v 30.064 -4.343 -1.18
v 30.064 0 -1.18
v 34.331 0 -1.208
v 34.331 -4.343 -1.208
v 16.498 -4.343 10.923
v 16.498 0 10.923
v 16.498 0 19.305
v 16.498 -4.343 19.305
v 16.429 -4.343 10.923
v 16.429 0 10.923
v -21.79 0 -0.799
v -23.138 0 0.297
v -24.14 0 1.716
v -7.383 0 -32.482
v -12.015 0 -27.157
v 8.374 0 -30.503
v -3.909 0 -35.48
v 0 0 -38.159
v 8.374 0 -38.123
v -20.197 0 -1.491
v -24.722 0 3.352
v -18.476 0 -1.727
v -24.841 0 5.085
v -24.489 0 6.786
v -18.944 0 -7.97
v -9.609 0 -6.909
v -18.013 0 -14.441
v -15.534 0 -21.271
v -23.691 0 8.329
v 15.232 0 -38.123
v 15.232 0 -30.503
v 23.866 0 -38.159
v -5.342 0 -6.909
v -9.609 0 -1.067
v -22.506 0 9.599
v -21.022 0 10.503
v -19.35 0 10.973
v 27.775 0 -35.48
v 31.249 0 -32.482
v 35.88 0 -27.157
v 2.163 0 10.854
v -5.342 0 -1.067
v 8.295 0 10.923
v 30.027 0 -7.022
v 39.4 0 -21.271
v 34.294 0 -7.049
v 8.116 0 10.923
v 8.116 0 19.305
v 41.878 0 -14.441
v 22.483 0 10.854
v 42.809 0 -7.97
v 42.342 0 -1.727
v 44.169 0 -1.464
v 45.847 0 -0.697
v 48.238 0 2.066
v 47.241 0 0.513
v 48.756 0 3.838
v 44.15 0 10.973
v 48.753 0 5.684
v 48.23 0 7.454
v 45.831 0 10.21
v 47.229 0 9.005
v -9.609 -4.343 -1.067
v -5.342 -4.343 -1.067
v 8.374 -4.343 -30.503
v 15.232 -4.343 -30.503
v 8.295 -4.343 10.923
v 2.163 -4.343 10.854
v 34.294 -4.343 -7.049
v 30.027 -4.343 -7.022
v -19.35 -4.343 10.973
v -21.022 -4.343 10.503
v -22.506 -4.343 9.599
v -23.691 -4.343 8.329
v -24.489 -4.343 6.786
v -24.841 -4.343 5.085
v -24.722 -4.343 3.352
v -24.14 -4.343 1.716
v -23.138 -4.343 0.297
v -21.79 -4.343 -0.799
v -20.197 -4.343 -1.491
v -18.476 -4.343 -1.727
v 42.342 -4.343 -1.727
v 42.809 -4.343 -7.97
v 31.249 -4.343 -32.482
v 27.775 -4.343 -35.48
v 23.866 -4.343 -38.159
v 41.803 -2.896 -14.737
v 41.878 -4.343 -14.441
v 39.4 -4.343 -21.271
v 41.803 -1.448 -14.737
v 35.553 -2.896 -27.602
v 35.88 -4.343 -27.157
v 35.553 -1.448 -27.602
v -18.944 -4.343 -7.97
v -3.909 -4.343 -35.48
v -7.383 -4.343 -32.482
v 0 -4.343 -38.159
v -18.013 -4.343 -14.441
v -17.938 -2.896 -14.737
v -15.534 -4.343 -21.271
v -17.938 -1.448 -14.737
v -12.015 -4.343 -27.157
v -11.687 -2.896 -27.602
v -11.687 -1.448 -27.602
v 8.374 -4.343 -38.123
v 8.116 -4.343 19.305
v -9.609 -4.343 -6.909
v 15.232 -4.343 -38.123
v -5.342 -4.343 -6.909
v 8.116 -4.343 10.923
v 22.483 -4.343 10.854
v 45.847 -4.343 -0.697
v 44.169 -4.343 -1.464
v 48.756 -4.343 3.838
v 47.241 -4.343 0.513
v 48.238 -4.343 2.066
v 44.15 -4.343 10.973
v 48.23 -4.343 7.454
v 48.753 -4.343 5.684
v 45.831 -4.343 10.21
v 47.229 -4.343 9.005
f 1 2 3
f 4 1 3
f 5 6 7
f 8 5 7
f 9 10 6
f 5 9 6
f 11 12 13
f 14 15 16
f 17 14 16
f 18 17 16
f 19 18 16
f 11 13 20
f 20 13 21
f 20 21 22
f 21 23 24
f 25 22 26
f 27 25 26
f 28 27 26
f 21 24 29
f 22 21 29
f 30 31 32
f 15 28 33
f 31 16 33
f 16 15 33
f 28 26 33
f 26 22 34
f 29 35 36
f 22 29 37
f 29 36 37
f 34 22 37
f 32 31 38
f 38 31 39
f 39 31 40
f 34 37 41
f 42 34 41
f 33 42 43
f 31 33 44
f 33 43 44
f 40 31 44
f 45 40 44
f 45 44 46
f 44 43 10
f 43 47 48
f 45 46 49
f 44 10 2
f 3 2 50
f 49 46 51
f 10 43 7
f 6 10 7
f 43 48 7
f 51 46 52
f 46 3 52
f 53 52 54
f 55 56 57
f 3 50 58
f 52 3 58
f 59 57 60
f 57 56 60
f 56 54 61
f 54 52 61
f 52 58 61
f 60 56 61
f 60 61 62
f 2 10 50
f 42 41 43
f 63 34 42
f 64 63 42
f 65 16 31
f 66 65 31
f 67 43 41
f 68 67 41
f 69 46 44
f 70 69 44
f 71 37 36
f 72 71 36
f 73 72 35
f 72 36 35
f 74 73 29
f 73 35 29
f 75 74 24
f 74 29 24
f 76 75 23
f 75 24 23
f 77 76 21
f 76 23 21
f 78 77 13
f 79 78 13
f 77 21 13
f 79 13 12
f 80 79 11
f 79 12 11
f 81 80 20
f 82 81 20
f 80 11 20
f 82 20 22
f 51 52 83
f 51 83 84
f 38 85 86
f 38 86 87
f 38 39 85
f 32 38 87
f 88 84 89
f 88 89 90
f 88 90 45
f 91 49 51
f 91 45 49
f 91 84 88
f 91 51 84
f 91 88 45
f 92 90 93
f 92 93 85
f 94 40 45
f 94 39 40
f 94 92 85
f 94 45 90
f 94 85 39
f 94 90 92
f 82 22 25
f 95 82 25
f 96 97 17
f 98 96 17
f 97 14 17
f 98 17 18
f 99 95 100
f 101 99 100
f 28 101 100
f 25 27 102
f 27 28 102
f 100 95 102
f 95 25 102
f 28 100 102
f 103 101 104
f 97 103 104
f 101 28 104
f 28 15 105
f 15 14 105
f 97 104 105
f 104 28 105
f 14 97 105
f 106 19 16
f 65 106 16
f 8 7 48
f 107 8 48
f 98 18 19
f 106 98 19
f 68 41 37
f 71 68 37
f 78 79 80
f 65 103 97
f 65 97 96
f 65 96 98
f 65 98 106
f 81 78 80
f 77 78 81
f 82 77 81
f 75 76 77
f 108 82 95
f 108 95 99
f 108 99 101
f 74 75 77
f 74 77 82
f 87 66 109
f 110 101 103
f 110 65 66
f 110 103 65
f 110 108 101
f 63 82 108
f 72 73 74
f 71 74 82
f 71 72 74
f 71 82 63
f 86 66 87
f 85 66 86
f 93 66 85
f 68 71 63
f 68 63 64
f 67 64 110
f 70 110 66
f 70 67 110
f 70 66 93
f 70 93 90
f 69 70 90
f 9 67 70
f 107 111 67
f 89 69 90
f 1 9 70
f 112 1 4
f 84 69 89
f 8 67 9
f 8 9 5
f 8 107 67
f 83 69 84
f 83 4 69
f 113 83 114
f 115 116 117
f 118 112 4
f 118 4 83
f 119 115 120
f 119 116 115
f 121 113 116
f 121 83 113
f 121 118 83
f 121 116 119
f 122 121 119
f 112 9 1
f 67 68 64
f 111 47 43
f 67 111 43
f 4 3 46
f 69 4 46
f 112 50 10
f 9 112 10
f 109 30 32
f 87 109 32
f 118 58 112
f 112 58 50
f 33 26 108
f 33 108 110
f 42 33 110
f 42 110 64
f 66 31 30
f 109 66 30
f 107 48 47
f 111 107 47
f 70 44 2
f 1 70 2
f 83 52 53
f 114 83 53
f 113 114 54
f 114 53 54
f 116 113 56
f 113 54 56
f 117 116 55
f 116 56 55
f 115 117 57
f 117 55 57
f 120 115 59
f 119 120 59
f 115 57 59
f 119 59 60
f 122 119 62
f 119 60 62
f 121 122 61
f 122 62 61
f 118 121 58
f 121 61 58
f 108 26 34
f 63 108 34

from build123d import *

# Parameters (mm, degrees)
F0_W     = 4.2672
F0_H     = 5.842
F1_DEPTH = 4.3434


with BuildPart() as f1:
    # F0 (on Front) → F1 (new body)
    with BuildSketch(Plane.XZ):
        with BuildLine():
            Line((2.1634316072, 10.8543494716), (-19.3501866255, 10.9726172321))
            ThreePointArc((-19.3501866255, 10.9726172321), (-24.8410026739, 4.2145660489), (-18.4759762851, -1.7273827679))
            add(Edge.make_bspline(
                [(-18.4759762851, -1.7273827679), (-20.8852616932, -14.0894673655), (-14.3136853987, -29.476307077), (0, -38.1591799864)],
                knots=[0, 0, 0, 0, 0.1710209887, 0.1710209887, 0.1710209887, 0.1710209887], degree=3))
            Line((0, -38.1591799864), (8.3743836731, -38.1230656058))
            Line((8.3743836731, -38.1230656058), (8.3743836731, -30.5030656058))
            Line((8.3743836731, -30.5030656058), (12.2675002734, -30.5030656058))
            Line((12.2675002734, -30.5030656058), (15.2323836731, -30.5030656058))
            Line((15.2323836731, -30.5030656058), (15.2323836731, -38.1230656058))
            Line((15.2323836731, -38.1230656058), (23.8656476492, -38.1591799864))
            add(Edge.make_bspline(
                [(42.3416239343, -1.7273827679), (44.7509093424, -14.0894673655), (38.1793330479, -29.476307077), (23.8656476492, -38.1591799864)],
                knots=[0, 0, 0, 0, 0.1710209887, 0.1710209887, 0.1710209887, 0.1710209887], degree=3))
            ThreePointArc((42.3416239343, -1.7273827679), (48.7556622303, 3.8381273274), (44.1498133745, 10.9726172321))
            Line((44.1498133745, 10.9726172321), (22.4834316072, 10.8543494716))
            Line((22.4834316072, 10.8543494716), (16.4287500314, 10.9232757241))
            Line((16.4287500314, 10.9232757241), (16.4984082512, 10.9232757241))
            Line((16.4984082512, 10.9232757241), (16.4984082512, 19.3052757241))
            Line((16.4984082512, 19.3052757241), (8.1164082512, 19.3052757241))
            Line((8.1164082512, 19.3052757241), (8.1164082512, 10.9232757241))
            Line((8.1164082512, 10.9232757241), (8.294825498, 10.9232757241))
            Line((8.294825498, 10.9232757241), (2.1634316072, 10.8543494716))
        make_face()
        with Locations((-7.4751781712, -3.9884169885)):
            Rectangle(F0_W, F0_H, mode=Mode.SUBTRACT)
        Polygon((30.0267527077, -7.0222468014), (30.0640258865, -1.180365708), (34.331139033, -1.2075913342), (34.2938658543, -7.0494724276), align=None, mode=Mode.SUBTRACT)
    extrude(amount=F1_DEPTH)


solid = f1.part
